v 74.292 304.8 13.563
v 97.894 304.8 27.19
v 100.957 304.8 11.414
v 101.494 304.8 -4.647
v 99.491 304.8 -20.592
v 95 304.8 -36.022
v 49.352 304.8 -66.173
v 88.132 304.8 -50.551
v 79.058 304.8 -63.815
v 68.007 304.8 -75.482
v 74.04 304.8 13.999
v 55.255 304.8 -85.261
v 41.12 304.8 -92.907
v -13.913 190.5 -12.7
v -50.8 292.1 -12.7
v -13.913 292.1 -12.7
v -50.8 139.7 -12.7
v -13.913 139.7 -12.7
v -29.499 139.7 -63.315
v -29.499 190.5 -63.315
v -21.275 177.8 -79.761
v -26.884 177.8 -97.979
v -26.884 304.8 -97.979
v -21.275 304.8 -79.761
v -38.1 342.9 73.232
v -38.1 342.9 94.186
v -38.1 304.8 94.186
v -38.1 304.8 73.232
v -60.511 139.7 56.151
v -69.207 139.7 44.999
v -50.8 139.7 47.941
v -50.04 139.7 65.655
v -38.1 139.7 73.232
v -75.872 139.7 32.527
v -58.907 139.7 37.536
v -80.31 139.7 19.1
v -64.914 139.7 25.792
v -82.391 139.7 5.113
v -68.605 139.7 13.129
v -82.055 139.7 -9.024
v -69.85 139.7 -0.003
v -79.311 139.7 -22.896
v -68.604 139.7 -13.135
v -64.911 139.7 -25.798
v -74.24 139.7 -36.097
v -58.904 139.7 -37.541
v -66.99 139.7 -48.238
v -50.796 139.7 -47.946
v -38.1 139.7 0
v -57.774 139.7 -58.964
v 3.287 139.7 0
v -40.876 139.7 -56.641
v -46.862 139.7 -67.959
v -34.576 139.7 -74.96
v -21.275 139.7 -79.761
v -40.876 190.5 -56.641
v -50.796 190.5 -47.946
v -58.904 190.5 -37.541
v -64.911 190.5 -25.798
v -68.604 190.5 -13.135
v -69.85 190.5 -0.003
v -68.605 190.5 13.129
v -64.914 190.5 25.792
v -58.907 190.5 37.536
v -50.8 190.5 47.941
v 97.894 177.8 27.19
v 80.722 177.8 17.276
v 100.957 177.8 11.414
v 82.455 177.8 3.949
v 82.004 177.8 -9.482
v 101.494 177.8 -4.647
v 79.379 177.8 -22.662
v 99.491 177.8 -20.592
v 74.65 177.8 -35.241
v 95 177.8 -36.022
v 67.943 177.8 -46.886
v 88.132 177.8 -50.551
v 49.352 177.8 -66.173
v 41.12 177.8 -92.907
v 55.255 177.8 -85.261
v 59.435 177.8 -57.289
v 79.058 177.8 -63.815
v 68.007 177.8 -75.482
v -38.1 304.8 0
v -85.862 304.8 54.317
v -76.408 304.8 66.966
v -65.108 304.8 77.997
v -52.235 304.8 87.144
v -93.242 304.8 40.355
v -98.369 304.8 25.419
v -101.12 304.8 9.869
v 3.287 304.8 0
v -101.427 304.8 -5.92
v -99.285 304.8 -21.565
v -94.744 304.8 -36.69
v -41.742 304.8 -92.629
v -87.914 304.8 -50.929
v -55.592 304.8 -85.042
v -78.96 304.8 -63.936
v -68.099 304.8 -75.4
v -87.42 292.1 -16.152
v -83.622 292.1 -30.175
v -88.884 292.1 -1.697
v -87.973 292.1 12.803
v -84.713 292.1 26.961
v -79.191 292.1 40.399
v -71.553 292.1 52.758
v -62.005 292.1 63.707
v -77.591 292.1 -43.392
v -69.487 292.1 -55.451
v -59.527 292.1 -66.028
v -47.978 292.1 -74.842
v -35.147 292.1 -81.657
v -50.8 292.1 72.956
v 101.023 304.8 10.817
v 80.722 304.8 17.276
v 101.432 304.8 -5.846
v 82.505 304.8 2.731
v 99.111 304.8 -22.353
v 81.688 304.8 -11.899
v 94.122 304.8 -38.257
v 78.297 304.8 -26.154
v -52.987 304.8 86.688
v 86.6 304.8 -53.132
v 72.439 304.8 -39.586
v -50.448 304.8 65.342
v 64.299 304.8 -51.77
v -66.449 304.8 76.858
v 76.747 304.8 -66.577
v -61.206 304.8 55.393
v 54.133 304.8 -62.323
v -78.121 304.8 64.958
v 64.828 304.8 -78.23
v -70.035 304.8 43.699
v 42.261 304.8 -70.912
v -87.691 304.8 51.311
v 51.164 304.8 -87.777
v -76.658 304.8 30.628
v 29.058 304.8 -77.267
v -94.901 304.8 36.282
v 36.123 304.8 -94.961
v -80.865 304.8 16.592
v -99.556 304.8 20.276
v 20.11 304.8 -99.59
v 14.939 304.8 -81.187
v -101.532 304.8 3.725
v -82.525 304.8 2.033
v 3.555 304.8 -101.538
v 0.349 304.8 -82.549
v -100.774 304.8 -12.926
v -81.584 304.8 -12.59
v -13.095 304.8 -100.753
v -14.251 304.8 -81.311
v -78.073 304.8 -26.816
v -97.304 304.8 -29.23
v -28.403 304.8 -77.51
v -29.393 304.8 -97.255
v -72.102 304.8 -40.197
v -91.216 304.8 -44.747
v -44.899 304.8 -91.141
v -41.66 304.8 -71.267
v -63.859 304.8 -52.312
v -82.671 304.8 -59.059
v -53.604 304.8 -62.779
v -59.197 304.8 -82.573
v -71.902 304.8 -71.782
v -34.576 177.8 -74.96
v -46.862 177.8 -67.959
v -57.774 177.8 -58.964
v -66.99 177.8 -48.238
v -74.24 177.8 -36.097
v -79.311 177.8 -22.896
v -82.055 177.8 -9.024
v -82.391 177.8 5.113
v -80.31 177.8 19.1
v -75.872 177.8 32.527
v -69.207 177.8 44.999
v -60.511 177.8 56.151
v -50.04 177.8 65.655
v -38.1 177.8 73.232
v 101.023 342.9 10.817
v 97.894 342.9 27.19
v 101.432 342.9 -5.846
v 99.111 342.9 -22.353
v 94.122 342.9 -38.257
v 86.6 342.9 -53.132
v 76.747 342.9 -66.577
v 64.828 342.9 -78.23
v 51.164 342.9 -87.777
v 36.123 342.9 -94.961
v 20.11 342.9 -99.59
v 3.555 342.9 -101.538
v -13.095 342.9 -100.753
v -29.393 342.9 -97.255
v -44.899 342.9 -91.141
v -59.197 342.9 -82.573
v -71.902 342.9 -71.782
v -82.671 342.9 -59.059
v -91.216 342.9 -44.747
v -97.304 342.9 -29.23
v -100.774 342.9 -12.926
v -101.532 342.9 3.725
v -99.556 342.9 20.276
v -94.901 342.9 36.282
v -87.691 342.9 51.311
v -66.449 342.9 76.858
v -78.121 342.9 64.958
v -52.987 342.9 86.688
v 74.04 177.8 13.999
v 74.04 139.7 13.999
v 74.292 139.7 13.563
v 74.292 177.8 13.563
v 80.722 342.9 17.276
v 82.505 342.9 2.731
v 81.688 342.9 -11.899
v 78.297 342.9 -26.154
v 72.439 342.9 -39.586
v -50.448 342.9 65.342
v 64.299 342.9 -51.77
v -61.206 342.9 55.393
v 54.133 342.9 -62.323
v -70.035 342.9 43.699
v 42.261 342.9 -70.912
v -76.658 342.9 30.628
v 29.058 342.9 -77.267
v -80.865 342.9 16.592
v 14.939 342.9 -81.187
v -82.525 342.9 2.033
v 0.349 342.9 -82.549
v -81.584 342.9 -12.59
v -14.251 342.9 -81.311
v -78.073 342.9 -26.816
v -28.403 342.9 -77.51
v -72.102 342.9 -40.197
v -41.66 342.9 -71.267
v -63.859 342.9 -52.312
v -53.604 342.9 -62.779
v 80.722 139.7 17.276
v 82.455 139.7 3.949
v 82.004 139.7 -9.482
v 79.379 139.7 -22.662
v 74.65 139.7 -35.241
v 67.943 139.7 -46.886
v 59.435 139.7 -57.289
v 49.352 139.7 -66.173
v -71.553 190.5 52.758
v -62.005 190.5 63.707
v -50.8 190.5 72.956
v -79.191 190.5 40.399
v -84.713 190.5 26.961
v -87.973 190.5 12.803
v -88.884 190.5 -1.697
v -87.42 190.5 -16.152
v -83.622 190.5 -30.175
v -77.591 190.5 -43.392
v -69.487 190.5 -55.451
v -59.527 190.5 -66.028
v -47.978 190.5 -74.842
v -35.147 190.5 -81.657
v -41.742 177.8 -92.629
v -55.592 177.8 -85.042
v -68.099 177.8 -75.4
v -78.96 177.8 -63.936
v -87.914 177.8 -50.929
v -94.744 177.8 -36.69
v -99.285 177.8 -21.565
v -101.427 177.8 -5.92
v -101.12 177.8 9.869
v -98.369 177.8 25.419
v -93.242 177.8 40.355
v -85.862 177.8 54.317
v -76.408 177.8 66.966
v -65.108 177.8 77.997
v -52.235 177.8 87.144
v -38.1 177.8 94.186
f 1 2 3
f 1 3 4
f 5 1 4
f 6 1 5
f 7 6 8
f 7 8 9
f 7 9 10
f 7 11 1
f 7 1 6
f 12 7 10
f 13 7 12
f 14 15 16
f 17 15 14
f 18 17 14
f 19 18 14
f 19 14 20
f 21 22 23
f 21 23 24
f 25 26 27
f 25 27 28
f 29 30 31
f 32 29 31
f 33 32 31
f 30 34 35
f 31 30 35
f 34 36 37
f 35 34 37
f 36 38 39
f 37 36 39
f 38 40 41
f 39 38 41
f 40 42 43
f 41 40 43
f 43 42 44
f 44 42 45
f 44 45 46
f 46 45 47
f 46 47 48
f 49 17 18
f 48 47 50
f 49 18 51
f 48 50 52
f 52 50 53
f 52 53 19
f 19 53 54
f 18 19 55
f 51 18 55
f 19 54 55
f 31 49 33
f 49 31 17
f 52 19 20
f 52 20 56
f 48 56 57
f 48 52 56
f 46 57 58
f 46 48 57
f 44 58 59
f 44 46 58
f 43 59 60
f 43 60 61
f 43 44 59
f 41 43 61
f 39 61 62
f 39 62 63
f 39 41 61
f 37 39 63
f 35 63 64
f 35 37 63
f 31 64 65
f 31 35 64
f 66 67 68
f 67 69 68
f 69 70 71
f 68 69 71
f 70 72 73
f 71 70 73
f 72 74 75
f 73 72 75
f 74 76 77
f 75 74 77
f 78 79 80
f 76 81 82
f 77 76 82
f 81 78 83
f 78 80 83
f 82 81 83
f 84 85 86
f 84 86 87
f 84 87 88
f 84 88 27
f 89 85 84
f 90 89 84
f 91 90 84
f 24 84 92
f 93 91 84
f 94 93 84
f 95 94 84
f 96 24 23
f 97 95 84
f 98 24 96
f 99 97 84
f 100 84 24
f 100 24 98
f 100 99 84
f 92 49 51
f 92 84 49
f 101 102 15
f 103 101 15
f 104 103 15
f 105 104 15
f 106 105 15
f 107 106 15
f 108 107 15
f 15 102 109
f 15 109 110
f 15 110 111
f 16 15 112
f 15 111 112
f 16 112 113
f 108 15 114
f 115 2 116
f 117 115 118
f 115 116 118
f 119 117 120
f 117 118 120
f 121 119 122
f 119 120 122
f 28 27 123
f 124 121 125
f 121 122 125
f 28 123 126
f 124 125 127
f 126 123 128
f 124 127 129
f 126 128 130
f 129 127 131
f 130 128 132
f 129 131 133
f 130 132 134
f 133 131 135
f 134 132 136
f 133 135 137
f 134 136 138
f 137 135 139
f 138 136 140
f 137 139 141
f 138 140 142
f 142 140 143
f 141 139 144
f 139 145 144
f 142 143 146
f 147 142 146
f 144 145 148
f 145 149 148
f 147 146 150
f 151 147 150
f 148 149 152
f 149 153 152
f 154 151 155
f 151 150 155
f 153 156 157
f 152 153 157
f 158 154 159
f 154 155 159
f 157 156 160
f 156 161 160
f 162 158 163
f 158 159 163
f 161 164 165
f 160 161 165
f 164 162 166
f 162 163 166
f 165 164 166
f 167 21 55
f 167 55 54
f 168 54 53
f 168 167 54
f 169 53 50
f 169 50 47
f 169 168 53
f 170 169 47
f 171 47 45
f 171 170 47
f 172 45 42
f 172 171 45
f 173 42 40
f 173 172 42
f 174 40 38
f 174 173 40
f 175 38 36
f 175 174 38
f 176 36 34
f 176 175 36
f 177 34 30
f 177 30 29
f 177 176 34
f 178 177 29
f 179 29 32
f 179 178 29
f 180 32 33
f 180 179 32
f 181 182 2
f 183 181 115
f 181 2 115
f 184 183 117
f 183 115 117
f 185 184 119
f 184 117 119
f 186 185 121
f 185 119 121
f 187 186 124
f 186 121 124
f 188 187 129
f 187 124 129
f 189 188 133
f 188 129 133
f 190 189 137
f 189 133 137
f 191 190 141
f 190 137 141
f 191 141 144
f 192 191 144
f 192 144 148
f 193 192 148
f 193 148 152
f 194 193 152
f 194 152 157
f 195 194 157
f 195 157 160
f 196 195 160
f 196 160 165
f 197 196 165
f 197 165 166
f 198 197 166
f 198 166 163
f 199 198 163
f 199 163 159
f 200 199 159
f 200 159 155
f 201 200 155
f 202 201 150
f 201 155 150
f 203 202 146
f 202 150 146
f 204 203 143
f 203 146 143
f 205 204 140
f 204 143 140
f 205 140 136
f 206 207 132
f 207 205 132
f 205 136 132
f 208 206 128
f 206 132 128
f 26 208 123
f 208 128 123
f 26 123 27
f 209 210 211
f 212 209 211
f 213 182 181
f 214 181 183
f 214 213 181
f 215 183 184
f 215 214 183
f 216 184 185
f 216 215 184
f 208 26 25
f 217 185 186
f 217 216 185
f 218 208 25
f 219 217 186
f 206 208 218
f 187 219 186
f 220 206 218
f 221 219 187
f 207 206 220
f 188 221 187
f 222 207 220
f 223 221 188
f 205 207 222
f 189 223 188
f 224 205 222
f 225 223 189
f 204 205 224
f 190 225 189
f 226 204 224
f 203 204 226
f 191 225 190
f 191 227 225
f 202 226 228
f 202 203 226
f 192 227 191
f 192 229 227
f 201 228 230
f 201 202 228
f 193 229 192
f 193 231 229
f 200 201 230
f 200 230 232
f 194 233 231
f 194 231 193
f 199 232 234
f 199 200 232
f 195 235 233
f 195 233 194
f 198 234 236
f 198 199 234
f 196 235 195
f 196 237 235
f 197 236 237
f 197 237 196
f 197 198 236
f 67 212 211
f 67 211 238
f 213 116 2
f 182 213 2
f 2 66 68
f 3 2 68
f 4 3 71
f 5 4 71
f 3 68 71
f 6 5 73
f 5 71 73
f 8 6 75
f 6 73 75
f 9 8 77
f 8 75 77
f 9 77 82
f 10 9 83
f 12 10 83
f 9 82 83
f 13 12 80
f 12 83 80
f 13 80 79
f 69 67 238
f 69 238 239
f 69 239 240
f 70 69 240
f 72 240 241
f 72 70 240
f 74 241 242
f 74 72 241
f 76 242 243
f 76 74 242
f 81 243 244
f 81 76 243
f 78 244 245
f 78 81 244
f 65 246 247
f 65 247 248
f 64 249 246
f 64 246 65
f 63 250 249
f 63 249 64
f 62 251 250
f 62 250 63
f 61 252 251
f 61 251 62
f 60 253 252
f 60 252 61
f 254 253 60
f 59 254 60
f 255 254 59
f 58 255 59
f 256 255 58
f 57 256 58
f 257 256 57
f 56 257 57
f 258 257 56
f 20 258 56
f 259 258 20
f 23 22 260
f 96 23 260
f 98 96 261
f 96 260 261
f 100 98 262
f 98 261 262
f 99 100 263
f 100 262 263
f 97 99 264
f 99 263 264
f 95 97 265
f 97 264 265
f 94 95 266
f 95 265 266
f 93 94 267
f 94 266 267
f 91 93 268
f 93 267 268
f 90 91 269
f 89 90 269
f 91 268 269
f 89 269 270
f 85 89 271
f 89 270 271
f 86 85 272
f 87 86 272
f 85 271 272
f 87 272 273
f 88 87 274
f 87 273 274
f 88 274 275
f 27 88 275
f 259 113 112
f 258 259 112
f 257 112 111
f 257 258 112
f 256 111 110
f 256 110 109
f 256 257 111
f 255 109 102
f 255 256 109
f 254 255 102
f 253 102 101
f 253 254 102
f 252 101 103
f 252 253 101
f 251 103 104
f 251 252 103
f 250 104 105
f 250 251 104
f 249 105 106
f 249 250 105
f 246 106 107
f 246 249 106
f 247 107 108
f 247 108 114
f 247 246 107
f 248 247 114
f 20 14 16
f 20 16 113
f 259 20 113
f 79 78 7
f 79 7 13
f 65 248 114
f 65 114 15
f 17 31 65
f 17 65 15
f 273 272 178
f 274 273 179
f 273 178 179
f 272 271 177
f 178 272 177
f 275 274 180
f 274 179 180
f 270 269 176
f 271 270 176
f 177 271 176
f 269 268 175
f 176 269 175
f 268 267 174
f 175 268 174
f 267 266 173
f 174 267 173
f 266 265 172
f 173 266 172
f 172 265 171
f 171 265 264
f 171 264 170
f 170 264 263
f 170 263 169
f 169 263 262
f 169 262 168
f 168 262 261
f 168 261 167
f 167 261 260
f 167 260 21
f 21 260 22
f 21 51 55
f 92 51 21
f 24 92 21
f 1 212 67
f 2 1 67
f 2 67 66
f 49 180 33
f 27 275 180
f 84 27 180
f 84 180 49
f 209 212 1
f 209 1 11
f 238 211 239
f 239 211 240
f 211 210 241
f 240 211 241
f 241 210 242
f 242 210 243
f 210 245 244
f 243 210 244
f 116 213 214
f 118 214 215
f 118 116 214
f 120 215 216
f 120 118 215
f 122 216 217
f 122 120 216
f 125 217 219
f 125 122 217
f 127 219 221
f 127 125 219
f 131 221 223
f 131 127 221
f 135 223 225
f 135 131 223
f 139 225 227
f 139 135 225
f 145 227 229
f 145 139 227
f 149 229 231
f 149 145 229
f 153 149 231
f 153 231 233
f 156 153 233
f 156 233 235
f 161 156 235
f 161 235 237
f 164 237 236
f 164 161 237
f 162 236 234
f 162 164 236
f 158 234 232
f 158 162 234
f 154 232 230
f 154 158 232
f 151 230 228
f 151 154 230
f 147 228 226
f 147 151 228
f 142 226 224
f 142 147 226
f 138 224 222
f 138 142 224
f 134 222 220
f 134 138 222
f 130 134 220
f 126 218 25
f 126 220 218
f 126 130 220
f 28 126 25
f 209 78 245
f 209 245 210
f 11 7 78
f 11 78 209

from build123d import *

# Parameters (mm, degrees)
SKETCH2_R               = 101.6
BOSS_EXTRUDE1_DEPTH     = 304.8
SKETCH3_R               = 101.6
SKETCH3_R_2             = 82.55
BOSS_EXTRUDE2_DEPTH     = 38.1
SKETCH4_W               = 76.2
SKETCH4_H               = 101.6
CUT_EXTRUDE1_DEPTH      = 228.6
CUT_EXTRUDE2_START      = -228.6
CUT_EXTRUDE2_DEPTH      = 190.5
SKETCH5_R               = 76.2
CUT_EXTRUDE3_DEPTH      = 25.4
CUT_EXTRUDE4_START      = -228.6
CUT_EXTRUDE4_DEPTH      = 228.6
CUT_EXTRUDE5_DEPTH      = 372.786941675
CUT_EXTRUDE6_DEPTH      = 372.786941675
CUT_EXTRUDE6_DEPTH_BACK = 372.786941675
SKETCH8_W               = 203.2
SKETCH8_H               = 177.8
BOSS_EXTRUDE3_START     = -165.1
BOSS_EXTRUDE3_DEPTH     = 38.1
SHELL1_START            = 190.5
SHELL1_DEPTH            = 101.6
SHELL1_START_2          = 139.7
SHELL1_2_DEPTH          = 50.8


# Read off the part's stored shape, not the designer's step: Shell1
with BuildPart() as part:
    # Sketch2 → Boss-Extrude1 (new body)
    with BuildSketch(Plane(origin=(0, 0, 0), x_dir=(1, 0, 0), z_dir=(0, 1, 0))):
        with Locations(Location((0, 0, 0), (0, 0, 90))):
            Circle(SKETCH2_R)
    extrude(amount=BOSS_EXTRUDE1_DEPTH)


with BuildPart() as body_2:
    # Sketch3 → Boss-Extrude2 (new body)
    with BuildSketch(Plane(origin=(0, 304.8, 0), x_dir=(1, 0, 0), z_dir=(0, 1, 0))):
        with Locations(Location((0, 0, 0), (0, 0, 90))):
            Circle(SKETCH3_R)
        with Locations(Location((0, 0, 0), (0, 0, 90))):
            Circle(SKETCH3_R_2, mode=Mode.SUBTRACT)
    extrude(amount=BOSS_EXTRUDE2_DEPTH)


with BuildPart() as cut_extrude1_tool:
    # Sketch4 → Cut-Extrude1 (new body)
    with BuildSketch(Plane(origin=(0, 342.9, 0), x_dir=(1, 0, 0), z_dir=(0, 1, 0))):
        with Locations((0, -50.8)):
            Rectangle(SKETCH4_W, SKETCH4_H)
    extrude(amount=-CUT_EXTRUDE1_DEPTH)


with BuildPart() as part_1:
    add(part.part)

    # Cut-Extrude1: cut by cut_extrude1_tool
    add(cut_extrude1_tool.part, mode=Mode.SUBTRACT)

    # Sketch4<4> → Cut-Extrude2 (cut)
    with BuildSketch(Plane(origin=(0, 342.9, 0), x_dir=(1, 0, 0), z_dir=(0, 1, 0)).offset(CUT_EXTRUDE2_START)):
        with BuildLine():
            ThreePointArc((78.027556588, -26.94815231), (62.505565542, -53.92176533), (38.1, -73.231772476))
            Line((38.1, -73.231772476), (38.1, -94.185720786))
            ThreePointArc((38.1, -94.185720786), (65.394822961, -77.756524678), (86.259952515, -53.682218584))
            Line((86.259952515, -53.682218584), (78.027556588, -26.94815231))
        make_face()
        with BuildLine():
            Line((-21.27474203, 79.761443389), (3.286721048, 0))
            Line((3.286721048, 0), (38.1, 0))
            Line((38.1, 0), (38.1, -73.231772476))
            ThreePointArc((38.1, -73.231772476), (62.505565542, -53.92176533), (78.027556588, -26.94815231))
            Line((78.027556588, -26.94815231), (49.352145598, 66.173017347))
            ThreePointArc((49.352145598, 66.173017347), (15.596361061, 81.063284054), (-21.27474203, 79.761443389))
        make_face()
        with BuildLine():
            Line((-26.884440108, 97.978502132), (-21.27474203, 79.761443389))
            ThreePointArc((-21.27474203, 79.761443389), (15.596361061, 81.063284054), (49.352145598, 66.173017347))
            Line((49.352145598, 66.173017347), (41.119749671, 92.907083621))
            ThreePointArc((41.119749671, 92.907083621), (7.555847472, 101.318651634), (-26.884440108, 97.978502132))
        make_face()
    extrude(amount=CUT_EXTRUDE2_DEPTH, mode=Mode.SUBTRACT)

    # Sketch5 → Cut-Extrude3 (cut)
    with BuildSketch(Plane.XZ):
        with Locations(Location((0, 0, 0), (0, 0, 270))):
            Circle(SKETCH5_R)
    extrude(amount=-CUT_EXTRUDE3_DEPTH, mode=Mode.SUBTRACT)


with BuildPart() as body_2_1:
    add(body_2.part)

    # Cut-Extrude1: cut by cut_extrude1_tool
    add(cut_extrude1_tool.part, mode=Mode.SUBTRACT)


with BuildPart() as cut_extrude4_tool:
    # Sketch6 → Cut-Extrude4 (new body)
    with BuildSketch(Plane(origin=(0, 342.9, 0), x_dir=(1, 0, 0), z_dir=(0, 1, 0)).offset(CUT_EXTRUDE4_START)):
        Polygon((48.891726717, -57.557045256), (74.291726717, -13.562954744), (107.287294601, -32.612954744), (60.297294601, -114.002022192), (14.155449479, -87.362015489), (35.745449479, -49.967038554), align=None)
    extrude(amount=CUT_EXTRUDE4_DEPTH)


with BuildPart() as part_2:
    add(part_1.part)

    # Cut-Extrude4: cut by cut_extrude4_tool
    add(cut_extrude4_tool.part, mode=Mode.SUBTRACT)

    # Sketch6<4> → Cut-Extrude5 (cut, through all)
    with BuildSketch(Plane(origin=(0, 342.9, 0), x_dir=(1, 0, 0), z_dir=(0, 1, 0))):
        with BuildLine():
            ThreePointArc((97.894189943, -27.189843241), (87.988181024, -50.8), (72.494189943, -71.183933753))
            Line((72.494189943, -71.183933753), (81.887294601, -76.607045256))
            Line((81.887294601, -76.607045256), (107.287294601, -32.612954744))
            Line((107.287294601, -32.612954744), (97.894189943, -27.189843241))
        make_face()
        with BuildLine():
            ThreePointArc((80.722105782, -17.275535828), (71.490397082, -41.275), (55.322105782, -61.26962634))
            Line((55.322105782, -61.26962634), (72.494189943, -71.183933753))
            ThreePointArc((72.494189943, -71.183933753), (87.988181024, -50.8), (97.894189943, -27.189843241))
            Line((97.894189943, -27.189843241), (80.722105782, -17.275535828))
        make_face()
        with BuildLine():
            Line((74.291726717, -13.562954744), (48.891726717, -57.557045256))
            Line((48.891726717, -57.557045256), (55.322105782, -61.26962634))
            ThreePointArc((55.322105782, -61.26962634), (71.490397082, -41.275), (80.722105782, -17.275535828))
            Line((80.722105782, -17.275535828), (74.291726717, -13.562954744))
        make_face()
    extrude(amount=-CUT_EXTRUDE5_DEPTH, mode=Mode.SUBTRACT)

    # Sketch8 → Cut-Extrude6 (cut, two sides: drawn at the far end of the back side and taken through both)
    with BuildSketch(Plane.XY.offset(-CUT_EXTRUDE6_DEPTH_BACK)):
        with Locations((0, 88.9)):
            Rectangle(SKETCH8_W, SKETCH8_H)
    extrude(amount=CUT_EXTRUDE6_DEPTH + CUT_EXTRUDE6_DEPTH_BACK, mode=Mode.SUBTRACT)


with BuildPart() as body_2_2:
    add(body_2_1.part)

    # Cut-Extrude4: cut by cut_extrude4_tool
    add(cut_extrude4_tool.part, mode=Mode.SUBTRACT)


with BuildPart() as cut_extrude6_piece_1:
    # of the separate pieces the step leaves, piece 1, a body of its own (cut_extrude6_pieces)
    add(part_2.part.solids().sort_by_distance((-26.884440108, 177.8, -97.978502132))[0])



with BuildPart() as cut_extrude6_piece_2:
    # of the separate pieces the step leaves, piece 2, a body of its own (cut_extrude6_pieces)
    add(part_2.part.solids().sort_by_distance((41.119749671, 177.8, -92.907083621))[0])


with BuildPart() as cut_extrude6_piece_1_1:
    add(cut_extrude6_piece_1.part)

    add(cut_extrude6_piece_2.part)  # Boss-Extrude3 merges Cut-Extrude6 piece 2
    # Sketch7 → Boss-Extrude3 (add)
    with BuildSketch(Plane(origin=(0, 342.9, 0), x_dir=(1, 0, 0), z_dir=(0, 1, 0)).offset(BOSS_EXTRUDE3_START)):
        with BuildLine():
            Line((3.286721048, 0), (-21.27474203, 79.761443389))
            ThreePointArc((-21.27474203, 79.761443389), (-82.055292474, 9.023939106), (-38.1, -73.231772476))
            Line((-38.1, -73.231772476), (-38.1, 0))
            Line((-38.1, 0), (3.286721048, 0))
        make_face()
        with BuildLine():
            Line((74.291726717, -13.562954744), (80.722105782, -17.275535828))
            ThreePointArc((80.722105782, -17.275535828), (77.270582855, 29.047539056), (49.352145598, 66.173017347))
            Line((49.352145598, 66.173017347), (74.040017303, -13.998928238))
            Line((74.040017303, -13.998928238), (74.291726717, -13.562954744))
        make_face()
    extrude(amount=-BOSS_EXTRUDE3_DEPTH)

    # Shell1 outline → Shell1 (cut)
    with BuildSketch(Plane(origin=(0, 0, 0), x_dir=(1, 0, 0), z_dir=(0, 1, 0)).offset(SHELL1_START)):
        with BuildLine():
            ThreePointArc((-35.147015765, 81.657193699), (-88.447883477, 8.954435127), (-50.8, -72.955945611))
            Line((-50.8, -72.955945611), (-50.8, 12.7))
            Line((-50.8, 12.7), (-13.912575978, 12.7))
            Line((-13.912575978, 12.7), (-35.147015765, 81.657193699))
        make_face()
    extrude(amount=SHELL1_DEPTH, mode=Mode.SUBTRACT)

    # Shell1 2 outline → Shell1 2 (cut)
    with BuildSketch(Plane(origin=(0, 0, 0), x_dir=(1, 0, 0), z_dir=(0, 1, 0)).offset(SHELL1_START_2)):
        with BuildLine():
            ThreePointArc((-29.498901057, 63.315379936), (-68.603927404, 13.134825645), (-50.8, -47.941448664))
            Line((-50.8, -47.941448664), (-50.8, 12.7))
            Line((-50.8, 12.7), (-13.912575978, 12.7))
            Line((-13.912575978, 12.7), (-29.498901057, 63.315379936))
        make_face()
    extrude(amount=SHELL1_2_DEPTH, mode=Mode.SUBTRACT)


solid = Compound([body_2_2.part, cut_extrude6_piece_1_1.part])
